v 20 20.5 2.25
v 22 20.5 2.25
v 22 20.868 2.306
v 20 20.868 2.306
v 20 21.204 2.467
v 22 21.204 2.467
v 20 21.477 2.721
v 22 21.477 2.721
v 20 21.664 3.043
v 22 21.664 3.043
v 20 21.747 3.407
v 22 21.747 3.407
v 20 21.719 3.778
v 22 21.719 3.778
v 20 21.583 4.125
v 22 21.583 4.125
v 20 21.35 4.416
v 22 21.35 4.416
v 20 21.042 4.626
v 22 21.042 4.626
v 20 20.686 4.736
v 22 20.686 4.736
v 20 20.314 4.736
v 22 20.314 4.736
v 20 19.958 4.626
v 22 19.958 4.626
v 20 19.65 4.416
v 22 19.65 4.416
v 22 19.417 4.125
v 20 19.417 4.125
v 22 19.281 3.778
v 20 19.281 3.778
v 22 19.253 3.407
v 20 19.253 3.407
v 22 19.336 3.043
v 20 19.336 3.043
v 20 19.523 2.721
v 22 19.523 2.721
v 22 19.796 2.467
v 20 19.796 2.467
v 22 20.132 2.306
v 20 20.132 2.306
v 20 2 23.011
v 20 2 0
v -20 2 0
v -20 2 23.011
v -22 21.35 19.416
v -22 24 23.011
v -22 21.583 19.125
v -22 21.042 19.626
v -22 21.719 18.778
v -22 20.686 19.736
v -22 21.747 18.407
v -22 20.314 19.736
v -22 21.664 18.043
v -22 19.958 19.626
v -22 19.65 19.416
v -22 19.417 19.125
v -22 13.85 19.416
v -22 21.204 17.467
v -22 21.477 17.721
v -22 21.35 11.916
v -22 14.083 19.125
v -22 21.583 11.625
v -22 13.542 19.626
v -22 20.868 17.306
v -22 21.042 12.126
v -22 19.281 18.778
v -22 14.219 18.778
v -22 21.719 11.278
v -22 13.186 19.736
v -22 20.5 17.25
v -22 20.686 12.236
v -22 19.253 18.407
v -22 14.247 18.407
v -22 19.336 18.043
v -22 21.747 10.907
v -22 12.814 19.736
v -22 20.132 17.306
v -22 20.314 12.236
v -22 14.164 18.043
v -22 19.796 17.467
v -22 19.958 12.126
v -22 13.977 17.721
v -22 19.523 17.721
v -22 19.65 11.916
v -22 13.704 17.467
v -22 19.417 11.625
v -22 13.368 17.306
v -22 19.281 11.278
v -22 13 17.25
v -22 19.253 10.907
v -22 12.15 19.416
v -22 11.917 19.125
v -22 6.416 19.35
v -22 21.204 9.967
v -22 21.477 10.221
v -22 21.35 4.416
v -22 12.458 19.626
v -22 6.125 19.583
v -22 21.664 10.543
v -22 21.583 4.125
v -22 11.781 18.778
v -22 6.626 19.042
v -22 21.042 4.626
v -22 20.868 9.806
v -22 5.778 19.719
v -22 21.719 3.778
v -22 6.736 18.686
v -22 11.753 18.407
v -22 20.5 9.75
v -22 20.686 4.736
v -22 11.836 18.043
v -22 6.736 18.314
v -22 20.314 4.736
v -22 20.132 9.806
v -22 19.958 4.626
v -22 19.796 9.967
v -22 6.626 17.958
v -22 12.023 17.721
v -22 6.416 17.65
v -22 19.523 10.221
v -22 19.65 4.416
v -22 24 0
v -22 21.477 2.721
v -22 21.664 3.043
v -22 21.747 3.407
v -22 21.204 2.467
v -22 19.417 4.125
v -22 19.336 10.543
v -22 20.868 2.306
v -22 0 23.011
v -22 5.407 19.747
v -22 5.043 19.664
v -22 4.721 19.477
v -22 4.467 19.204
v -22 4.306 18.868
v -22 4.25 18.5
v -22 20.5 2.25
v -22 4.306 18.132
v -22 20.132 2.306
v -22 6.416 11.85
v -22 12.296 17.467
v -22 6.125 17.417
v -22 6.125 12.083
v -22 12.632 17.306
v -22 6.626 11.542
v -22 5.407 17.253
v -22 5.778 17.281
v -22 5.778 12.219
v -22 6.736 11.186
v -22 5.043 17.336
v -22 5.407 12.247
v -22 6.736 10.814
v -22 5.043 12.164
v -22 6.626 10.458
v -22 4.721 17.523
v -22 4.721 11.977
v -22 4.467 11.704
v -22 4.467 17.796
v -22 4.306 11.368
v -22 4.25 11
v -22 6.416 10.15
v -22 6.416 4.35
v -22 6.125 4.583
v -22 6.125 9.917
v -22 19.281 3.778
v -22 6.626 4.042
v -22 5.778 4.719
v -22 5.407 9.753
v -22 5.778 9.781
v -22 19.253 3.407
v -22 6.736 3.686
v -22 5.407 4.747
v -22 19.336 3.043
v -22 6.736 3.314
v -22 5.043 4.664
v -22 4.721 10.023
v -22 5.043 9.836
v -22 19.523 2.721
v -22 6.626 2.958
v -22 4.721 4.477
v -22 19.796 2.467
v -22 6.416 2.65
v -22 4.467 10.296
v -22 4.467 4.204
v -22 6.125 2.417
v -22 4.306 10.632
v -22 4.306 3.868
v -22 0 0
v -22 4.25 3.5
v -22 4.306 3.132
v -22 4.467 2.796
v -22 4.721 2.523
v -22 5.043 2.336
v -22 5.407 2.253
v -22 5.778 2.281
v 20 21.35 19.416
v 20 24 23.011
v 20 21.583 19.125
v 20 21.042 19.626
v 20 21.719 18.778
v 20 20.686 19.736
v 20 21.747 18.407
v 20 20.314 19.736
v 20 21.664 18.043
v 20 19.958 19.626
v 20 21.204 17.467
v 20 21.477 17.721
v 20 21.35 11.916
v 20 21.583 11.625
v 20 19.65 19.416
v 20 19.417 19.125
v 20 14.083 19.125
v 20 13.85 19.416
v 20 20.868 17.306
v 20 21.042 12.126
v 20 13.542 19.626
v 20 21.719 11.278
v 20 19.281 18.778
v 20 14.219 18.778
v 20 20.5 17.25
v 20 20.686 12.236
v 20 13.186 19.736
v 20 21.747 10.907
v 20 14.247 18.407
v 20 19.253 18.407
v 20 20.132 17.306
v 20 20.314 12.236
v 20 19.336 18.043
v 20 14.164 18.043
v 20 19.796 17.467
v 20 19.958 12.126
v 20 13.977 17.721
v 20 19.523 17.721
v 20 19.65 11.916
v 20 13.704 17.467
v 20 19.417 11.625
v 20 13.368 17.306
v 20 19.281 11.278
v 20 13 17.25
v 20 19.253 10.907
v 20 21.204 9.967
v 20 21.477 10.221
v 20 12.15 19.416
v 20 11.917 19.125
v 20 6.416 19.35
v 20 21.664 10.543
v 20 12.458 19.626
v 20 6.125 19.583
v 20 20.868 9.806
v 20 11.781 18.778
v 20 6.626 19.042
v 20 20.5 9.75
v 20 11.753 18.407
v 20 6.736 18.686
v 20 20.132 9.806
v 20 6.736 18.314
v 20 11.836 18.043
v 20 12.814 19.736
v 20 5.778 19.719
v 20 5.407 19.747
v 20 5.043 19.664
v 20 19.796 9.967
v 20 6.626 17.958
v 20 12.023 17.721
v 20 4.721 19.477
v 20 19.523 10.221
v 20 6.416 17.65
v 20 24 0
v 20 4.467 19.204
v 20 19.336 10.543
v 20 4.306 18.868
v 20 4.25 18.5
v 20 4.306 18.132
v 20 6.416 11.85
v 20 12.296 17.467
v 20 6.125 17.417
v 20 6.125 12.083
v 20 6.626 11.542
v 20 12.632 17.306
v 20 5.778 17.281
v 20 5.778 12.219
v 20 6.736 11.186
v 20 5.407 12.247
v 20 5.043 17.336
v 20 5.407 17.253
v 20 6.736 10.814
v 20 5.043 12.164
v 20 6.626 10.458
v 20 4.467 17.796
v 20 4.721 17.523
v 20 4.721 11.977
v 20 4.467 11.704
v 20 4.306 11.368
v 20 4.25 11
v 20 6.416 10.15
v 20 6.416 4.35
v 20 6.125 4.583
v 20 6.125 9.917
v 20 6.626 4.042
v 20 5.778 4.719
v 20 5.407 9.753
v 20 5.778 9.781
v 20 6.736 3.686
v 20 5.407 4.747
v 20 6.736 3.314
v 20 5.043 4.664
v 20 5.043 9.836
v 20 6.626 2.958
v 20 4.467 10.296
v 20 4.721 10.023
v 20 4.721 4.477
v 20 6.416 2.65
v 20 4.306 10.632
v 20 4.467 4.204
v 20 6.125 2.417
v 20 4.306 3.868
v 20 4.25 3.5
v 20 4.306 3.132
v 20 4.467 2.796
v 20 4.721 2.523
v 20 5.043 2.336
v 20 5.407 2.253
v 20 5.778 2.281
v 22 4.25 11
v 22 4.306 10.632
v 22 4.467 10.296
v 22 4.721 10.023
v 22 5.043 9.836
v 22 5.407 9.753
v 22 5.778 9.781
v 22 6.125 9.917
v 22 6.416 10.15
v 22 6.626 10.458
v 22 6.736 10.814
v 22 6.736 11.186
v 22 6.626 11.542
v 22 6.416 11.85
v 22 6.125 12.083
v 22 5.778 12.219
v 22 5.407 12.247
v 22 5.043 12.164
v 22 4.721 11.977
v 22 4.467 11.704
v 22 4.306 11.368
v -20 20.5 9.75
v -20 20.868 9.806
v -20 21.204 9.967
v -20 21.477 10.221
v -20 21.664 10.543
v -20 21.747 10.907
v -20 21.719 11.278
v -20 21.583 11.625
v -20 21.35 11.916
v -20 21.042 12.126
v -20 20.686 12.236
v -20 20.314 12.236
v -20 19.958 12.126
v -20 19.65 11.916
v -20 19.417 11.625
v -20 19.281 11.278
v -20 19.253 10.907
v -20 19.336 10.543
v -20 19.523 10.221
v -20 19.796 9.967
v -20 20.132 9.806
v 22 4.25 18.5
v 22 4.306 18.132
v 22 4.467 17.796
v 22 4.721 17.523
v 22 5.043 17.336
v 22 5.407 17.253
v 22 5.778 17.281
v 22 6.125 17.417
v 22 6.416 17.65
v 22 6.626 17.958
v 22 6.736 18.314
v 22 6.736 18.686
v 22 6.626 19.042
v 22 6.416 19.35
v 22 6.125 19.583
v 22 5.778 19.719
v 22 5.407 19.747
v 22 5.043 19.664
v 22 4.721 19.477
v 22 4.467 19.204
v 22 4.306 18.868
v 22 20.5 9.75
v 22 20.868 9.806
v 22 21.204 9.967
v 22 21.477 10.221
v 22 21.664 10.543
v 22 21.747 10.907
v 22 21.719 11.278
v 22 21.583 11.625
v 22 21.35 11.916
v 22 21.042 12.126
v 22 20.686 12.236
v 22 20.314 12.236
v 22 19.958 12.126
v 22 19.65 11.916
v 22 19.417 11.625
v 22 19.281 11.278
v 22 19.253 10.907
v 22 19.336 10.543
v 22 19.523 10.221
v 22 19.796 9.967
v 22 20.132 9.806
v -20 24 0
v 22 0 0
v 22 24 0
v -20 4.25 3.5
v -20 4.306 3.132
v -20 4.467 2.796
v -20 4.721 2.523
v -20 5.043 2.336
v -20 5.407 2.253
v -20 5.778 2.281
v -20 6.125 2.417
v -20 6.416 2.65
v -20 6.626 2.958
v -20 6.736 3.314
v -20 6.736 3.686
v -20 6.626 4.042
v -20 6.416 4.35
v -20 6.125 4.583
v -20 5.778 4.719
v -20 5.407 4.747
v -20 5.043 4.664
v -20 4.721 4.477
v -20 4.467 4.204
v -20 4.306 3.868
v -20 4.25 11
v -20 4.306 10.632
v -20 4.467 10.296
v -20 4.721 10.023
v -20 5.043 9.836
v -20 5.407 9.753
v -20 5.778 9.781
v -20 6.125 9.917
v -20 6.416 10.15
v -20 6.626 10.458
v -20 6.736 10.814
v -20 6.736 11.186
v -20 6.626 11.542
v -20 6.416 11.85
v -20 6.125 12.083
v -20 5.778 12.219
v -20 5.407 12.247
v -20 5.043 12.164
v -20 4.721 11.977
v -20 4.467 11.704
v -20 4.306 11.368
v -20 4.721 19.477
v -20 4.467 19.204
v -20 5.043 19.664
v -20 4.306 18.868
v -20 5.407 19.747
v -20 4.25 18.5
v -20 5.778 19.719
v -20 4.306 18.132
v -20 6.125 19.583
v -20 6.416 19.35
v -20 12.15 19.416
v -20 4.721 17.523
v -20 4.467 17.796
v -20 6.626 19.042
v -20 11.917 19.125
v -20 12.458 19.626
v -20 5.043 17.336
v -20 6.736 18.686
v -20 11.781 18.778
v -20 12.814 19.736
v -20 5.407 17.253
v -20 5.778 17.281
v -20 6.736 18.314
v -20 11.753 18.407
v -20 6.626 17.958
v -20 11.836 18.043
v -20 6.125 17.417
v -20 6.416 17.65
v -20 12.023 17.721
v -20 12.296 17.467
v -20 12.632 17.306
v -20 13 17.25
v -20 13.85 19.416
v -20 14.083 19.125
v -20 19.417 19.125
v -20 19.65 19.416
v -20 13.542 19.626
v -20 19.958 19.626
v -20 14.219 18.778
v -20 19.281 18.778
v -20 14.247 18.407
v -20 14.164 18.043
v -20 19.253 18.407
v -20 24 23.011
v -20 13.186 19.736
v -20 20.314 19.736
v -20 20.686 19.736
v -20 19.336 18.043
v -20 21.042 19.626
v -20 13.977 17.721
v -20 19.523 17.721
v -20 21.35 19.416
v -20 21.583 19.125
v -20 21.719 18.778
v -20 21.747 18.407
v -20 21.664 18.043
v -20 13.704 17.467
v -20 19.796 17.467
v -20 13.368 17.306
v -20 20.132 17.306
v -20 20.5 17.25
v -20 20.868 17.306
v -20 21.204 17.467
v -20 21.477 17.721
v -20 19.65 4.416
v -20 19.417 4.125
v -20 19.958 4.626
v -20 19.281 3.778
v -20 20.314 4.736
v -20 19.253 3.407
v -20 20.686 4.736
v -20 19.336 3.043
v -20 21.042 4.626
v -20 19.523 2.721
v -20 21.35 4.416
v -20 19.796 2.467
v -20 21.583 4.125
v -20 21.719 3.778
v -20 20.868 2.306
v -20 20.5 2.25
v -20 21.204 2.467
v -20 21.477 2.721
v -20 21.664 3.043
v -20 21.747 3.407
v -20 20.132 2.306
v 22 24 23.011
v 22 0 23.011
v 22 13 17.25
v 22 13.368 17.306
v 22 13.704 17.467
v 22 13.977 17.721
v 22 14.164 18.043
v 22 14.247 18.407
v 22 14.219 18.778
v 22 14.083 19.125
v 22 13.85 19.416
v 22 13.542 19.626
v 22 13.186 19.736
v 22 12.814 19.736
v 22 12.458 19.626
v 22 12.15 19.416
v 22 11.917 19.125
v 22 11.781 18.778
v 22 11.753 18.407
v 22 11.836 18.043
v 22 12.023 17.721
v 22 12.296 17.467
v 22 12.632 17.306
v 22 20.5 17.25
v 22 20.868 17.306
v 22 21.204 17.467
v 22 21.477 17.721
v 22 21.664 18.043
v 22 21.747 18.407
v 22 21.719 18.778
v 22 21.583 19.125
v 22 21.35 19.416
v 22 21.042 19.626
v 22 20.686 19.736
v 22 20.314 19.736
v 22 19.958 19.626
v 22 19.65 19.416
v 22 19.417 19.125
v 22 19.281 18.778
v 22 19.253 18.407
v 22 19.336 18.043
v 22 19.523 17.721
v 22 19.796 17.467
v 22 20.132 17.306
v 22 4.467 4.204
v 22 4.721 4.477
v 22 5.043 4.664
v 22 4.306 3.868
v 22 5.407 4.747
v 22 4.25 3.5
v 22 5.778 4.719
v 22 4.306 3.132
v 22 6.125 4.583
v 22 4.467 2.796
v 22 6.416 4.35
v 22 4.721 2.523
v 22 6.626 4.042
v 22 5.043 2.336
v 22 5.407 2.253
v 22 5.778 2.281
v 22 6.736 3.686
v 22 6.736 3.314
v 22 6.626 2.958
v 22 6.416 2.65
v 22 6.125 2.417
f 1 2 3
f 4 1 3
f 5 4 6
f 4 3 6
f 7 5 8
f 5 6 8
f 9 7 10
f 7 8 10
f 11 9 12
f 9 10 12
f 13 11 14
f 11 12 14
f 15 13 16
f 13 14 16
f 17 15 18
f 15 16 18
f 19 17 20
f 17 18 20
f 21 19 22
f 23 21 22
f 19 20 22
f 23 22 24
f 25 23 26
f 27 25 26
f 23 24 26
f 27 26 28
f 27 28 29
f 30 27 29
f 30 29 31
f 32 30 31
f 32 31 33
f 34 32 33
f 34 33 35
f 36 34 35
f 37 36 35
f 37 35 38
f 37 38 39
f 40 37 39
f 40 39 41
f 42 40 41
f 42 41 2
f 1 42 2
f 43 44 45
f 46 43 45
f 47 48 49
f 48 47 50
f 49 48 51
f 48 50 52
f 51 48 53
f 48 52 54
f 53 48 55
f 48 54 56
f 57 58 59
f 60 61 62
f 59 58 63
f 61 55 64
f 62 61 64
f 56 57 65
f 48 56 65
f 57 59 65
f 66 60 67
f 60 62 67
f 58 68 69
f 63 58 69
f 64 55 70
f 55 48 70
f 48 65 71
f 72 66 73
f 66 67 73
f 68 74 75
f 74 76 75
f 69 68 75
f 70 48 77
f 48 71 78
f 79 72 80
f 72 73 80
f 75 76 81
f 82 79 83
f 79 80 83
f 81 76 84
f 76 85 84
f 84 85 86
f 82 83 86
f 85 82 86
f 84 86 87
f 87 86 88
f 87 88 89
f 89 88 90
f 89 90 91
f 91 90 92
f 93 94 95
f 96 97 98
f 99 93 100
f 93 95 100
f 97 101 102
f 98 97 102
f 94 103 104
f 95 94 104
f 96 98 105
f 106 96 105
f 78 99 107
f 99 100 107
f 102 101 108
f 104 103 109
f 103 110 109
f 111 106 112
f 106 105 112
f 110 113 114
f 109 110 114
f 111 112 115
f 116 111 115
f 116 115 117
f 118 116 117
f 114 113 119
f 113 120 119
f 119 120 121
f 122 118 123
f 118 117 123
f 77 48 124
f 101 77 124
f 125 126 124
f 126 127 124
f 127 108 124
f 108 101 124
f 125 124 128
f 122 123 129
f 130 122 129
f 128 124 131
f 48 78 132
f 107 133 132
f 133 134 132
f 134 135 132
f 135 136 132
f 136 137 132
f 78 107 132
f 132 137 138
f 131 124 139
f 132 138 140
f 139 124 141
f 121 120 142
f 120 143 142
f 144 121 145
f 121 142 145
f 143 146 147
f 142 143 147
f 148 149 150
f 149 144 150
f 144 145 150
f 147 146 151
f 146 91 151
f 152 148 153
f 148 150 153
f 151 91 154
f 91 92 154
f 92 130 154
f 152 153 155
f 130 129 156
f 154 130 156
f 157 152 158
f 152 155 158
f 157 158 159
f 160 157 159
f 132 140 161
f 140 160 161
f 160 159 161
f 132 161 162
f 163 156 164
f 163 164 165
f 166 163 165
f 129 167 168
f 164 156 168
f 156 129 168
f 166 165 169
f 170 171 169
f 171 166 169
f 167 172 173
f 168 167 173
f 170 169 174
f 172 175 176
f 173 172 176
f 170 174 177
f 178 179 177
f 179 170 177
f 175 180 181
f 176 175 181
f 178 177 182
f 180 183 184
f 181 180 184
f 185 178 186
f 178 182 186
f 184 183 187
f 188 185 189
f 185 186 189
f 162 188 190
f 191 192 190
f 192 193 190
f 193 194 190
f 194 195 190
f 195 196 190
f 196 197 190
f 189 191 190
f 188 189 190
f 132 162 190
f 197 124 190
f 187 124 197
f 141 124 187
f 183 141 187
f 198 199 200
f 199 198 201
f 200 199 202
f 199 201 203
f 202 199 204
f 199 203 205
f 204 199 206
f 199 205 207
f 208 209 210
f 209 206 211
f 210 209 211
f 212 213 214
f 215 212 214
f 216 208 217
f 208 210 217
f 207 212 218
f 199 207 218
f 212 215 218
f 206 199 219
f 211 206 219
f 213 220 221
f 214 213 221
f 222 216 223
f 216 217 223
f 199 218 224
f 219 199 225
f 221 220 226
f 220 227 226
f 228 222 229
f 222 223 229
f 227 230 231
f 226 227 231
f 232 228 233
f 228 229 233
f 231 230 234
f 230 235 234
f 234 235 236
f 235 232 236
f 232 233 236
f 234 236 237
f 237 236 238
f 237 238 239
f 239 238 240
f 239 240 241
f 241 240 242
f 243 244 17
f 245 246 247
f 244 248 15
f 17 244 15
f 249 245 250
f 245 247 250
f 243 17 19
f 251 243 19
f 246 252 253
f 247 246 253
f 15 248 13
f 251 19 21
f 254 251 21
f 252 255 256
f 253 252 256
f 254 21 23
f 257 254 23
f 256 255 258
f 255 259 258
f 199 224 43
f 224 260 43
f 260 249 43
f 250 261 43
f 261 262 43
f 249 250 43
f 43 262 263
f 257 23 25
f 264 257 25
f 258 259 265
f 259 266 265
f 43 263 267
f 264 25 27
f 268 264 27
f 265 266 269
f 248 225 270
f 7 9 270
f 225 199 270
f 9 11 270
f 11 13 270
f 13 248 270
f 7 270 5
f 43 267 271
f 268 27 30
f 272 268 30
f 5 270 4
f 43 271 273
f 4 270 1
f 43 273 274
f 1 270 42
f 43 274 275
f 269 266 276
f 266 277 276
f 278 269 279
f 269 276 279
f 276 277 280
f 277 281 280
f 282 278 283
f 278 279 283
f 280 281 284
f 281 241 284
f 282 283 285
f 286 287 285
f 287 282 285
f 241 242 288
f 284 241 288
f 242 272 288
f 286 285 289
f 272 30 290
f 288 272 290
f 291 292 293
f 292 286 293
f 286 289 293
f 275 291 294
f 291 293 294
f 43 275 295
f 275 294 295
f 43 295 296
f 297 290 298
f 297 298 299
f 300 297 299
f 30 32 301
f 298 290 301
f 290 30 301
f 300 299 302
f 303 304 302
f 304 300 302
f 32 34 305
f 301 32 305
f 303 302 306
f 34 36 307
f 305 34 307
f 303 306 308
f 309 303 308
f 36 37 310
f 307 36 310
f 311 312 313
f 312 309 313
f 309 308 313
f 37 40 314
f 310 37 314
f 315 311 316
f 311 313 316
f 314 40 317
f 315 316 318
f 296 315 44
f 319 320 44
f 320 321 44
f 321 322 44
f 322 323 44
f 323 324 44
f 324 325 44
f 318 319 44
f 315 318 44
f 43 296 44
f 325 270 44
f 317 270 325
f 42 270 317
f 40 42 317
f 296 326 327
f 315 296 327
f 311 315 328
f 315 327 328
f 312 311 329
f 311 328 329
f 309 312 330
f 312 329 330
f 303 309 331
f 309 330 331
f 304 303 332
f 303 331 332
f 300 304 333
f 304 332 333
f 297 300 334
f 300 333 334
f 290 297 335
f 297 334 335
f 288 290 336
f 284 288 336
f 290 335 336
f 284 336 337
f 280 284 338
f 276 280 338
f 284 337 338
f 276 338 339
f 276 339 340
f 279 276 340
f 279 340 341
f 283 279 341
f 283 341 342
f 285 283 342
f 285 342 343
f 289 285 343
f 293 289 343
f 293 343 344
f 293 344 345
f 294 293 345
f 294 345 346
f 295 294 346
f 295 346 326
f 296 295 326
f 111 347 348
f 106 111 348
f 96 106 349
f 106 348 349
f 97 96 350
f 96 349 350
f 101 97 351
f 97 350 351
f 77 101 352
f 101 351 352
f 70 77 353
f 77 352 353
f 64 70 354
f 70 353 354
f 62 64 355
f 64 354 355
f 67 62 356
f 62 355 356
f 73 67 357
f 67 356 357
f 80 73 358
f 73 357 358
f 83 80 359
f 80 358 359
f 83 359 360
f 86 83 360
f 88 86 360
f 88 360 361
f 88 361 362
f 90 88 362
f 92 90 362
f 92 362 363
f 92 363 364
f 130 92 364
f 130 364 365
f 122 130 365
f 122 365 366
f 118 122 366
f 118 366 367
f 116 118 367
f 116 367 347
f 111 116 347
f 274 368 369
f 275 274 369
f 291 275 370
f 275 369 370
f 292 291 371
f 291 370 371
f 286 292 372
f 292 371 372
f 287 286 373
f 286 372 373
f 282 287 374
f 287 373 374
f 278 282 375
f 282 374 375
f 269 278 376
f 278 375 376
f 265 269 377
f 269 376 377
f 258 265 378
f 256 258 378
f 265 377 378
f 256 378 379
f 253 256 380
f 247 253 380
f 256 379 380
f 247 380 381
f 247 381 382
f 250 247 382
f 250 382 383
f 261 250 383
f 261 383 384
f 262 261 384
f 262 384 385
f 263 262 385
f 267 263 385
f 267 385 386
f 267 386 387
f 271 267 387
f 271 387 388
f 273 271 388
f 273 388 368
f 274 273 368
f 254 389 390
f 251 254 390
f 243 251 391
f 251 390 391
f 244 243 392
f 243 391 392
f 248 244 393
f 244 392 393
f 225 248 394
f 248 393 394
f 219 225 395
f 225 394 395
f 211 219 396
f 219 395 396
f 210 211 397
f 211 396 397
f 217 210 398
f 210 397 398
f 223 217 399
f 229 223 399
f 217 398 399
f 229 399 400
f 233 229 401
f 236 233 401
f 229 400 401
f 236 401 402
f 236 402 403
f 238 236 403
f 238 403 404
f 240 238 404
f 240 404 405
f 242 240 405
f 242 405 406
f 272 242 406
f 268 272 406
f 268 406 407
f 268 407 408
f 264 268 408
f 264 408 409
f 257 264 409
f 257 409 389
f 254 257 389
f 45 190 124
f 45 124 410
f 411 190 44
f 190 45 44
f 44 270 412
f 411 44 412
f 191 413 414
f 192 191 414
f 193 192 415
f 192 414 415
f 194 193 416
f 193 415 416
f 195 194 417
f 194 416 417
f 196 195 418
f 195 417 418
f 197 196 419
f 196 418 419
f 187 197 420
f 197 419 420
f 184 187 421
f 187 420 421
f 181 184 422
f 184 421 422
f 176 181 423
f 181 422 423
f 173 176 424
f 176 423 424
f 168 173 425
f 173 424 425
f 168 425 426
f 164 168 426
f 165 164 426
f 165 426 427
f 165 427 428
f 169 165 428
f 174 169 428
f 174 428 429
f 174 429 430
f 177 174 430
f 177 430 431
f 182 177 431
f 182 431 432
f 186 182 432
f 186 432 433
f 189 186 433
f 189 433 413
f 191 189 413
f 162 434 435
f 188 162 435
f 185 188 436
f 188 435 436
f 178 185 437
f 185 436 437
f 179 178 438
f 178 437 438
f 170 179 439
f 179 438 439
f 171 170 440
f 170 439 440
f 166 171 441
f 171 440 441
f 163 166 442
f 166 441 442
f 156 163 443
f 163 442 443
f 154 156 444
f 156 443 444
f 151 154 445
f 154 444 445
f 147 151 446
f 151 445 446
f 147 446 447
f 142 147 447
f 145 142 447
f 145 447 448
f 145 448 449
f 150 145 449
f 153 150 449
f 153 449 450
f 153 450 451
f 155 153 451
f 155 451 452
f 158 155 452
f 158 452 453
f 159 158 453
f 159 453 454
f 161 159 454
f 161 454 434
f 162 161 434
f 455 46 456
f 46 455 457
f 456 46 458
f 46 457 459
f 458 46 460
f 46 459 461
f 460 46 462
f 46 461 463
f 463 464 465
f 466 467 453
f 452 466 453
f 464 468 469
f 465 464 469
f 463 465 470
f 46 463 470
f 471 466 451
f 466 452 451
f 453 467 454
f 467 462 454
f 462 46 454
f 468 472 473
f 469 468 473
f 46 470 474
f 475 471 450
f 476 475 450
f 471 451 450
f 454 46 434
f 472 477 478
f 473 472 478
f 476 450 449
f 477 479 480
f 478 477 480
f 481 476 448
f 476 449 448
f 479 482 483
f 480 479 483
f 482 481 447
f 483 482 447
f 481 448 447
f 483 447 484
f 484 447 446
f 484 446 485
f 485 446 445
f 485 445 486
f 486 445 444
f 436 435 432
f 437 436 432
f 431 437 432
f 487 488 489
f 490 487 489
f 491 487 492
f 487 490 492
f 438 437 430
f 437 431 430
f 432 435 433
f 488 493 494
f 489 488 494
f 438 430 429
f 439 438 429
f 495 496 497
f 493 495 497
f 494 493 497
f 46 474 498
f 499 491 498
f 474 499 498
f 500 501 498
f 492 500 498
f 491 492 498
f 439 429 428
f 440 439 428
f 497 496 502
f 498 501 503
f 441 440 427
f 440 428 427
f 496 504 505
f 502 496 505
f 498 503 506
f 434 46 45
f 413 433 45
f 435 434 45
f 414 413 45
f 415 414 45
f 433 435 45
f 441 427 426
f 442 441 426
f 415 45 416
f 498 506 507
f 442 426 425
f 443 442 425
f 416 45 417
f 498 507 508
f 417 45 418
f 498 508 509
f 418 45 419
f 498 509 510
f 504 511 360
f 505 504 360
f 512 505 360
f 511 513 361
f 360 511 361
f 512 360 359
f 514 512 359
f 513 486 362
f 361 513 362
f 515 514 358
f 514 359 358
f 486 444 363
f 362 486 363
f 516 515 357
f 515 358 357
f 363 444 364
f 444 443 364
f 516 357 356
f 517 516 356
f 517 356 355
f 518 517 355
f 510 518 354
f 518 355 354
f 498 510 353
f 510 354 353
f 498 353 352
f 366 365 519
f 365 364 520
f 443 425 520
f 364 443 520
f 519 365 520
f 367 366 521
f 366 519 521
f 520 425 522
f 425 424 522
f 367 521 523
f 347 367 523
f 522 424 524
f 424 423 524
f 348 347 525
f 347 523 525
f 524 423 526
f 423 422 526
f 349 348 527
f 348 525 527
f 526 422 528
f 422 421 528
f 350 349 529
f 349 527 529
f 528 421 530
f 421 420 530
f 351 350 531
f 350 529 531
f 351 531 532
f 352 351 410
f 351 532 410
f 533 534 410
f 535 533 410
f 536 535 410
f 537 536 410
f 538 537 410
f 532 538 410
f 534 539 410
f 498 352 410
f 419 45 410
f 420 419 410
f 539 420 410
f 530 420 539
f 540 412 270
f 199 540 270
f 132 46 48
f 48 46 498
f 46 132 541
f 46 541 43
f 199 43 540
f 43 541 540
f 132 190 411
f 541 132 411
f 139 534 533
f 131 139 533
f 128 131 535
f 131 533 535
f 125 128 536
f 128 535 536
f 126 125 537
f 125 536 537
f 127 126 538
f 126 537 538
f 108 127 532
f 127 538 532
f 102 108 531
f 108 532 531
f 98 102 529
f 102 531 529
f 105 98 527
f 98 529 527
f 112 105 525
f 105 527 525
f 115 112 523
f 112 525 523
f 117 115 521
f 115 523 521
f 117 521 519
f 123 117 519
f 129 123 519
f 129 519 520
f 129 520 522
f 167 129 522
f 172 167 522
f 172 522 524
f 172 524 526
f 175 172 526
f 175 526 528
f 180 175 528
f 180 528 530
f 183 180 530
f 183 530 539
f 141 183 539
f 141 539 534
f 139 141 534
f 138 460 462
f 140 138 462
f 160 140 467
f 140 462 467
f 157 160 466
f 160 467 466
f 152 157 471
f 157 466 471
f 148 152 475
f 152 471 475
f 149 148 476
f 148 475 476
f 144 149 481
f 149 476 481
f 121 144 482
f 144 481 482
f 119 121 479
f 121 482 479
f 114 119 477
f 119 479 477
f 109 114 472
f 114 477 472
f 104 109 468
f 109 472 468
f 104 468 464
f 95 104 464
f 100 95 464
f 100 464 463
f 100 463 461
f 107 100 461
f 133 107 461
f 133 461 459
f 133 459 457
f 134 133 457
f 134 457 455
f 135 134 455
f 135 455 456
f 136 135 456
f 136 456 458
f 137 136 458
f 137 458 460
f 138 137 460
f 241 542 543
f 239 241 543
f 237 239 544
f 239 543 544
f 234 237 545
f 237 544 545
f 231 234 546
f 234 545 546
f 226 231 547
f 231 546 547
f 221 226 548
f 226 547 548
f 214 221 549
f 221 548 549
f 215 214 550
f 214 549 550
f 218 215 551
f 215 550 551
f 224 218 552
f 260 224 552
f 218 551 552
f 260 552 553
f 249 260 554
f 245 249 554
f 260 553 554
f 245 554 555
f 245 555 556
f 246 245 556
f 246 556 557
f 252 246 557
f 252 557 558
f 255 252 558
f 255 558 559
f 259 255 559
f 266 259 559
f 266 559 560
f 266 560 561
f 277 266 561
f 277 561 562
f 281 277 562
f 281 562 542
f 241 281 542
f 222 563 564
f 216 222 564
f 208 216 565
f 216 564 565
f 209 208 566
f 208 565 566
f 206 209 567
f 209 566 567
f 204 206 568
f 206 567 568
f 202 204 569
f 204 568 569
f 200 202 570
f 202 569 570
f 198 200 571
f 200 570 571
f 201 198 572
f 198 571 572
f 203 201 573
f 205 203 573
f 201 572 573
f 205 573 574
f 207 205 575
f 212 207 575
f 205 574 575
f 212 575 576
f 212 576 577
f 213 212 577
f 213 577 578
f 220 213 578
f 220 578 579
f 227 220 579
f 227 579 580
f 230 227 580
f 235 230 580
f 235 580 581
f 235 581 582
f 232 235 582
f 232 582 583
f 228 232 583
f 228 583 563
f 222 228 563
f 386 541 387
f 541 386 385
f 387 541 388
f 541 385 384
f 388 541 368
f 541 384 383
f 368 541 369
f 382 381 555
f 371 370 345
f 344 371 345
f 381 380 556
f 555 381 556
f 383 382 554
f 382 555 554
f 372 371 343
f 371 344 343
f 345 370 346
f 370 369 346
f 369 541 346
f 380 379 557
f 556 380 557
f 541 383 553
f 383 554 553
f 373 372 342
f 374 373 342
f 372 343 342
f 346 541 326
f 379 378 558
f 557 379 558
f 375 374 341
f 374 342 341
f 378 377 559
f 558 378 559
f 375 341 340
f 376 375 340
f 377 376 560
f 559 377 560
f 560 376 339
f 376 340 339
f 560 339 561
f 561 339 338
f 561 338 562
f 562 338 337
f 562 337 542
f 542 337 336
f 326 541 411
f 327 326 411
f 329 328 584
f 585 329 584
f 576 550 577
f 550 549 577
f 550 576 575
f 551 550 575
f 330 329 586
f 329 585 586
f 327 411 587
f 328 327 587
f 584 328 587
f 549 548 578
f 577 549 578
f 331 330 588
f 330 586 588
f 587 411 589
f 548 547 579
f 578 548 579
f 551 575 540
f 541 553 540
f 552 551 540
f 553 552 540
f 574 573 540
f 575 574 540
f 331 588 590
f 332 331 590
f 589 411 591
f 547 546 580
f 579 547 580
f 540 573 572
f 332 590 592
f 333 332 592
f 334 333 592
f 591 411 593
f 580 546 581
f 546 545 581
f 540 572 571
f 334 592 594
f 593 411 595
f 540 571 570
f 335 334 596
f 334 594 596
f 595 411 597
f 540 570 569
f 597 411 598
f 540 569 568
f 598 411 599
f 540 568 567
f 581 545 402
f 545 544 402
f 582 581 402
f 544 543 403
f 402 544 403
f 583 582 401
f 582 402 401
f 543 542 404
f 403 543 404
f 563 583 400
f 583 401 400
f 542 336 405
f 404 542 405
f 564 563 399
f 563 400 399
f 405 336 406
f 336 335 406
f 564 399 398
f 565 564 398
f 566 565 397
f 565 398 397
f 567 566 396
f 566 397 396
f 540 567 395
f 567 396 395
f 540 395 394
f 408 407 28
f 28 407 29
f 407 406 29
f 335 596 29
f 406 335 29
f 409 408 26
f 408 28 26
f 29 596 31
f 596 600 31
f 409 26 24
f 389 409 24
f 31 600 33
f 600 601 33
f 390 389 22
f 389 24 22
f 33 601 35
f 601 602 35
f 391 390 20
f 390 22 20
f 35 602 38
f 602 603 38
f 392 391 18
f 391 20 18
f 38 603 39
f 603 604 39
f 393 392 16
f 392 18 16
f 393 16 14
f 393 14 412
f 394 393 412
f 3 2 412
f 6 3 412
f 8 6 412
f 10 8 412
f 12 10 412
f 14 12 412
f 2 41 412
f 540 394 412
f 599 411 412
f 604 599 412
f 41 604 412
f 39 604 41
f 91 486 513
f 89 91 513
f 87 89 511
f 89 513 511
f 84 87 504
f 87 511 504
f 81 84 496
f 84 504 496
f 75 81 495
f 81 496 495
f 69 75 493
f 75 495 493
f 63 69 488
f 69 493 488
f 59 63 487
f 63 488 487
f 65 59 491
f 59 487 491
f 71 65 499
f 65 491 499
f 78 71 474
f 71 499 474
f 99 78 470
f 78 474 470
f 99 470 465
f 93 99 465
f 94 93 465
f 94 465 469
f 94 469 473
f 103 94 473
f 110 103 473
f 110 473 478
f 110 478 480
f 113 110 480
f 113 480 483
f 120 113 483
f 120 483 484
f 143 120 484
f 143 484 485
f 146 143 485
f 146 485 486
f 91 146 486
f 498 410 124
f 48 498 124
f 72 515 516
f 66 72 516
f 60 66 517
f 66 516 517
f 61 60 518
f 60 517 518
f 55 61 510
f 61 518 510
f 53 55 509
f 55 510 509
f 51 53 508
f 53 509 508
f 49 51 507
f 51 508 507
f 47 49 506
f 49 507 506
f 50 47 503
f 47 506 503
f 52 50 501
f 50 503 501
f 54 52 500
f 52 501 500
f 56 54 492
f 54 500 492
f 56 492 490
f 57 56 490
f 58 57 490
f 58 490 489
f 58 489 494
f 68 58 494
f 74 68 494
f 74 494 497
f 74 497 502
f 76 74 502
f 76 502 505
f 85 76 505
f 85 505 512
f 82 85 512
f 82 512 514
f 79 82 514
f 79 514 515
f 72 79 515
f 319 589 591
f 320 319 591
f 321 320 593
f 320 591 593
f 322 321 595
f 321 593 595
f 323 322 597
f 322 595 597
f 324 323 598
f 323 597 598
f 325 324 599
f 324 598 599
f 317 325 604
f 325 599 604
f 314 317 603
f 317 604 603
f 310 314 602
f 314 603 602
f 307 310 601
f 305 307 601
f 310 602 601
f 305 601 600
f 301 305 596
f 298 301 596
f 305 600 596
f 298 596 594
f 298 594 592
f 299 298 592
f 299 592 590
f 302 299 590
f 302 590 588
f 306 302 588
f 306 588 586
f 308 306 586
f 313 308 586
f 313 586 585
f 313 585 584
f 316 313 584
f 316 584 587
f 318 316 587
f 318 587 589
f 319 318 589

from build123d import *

# Parameters (mm, degrees)
EXTRUDE_1_DEPTH     = 32
SKETCH_3_R          = 1.25
CUT_EXTRUDE_2_DEPTH = 60.464274989
SKETCH_5_R          = 2.2
CUT_EXTRUDE_3_DEPTH = 45.631827209
SKETCH_6_W          = 8.988665833
SKETCH_6_H          = 24
CUT_EXTRUDE_4_DEPTH = 60.464274989


with BuildPart() as part:
    # 草图1 → 凸台-拉伸1 (new body)
    with BuildSketch(Plane.XY):
        Polygon((-22, 0), (22, 0), (22, 24), (20, 24), (20, 2), (-20, 2), (-20, 24), (-22, 24), align=None)
    extrude(amount=EXTRUDE_1_DEPTH)

    # 草图3 → 切除-拉伸2 (cut, through all)
    with BuildSketch(Plane(origin=(22, 0, 0), x_dir=(0, 0, -1), z_dir=(1, 0, 0))):
        with Locations((-3.5, 20.5)):
            Circle(SKETCH_3_R)
        with Locations((-18.5, 20.5)):
            Circle(SKETCH_3_R)
        with Locations((-11, 20.5)):
            Circle(SKETCH_3_R)
        with Locations(Location((-3.5, 5.5, 0), (0, 0, 270))):
            Circle(SKETCH_3_R)
        with Locations(Location((-11, 5.5, 0), (0, 0, 270))):
            Circle(SKETCH_3_R)
        with Locations(Location((-18.5, 5.5, 0), (0, 0, 270))):
            Circle(SKETCH_3_R)
        with Locations((-18.5, 13)):
            Circle(SKETCH_3_R)
    extrude(amount=-CUT_EXTRUDE_2_DEPTH, mode=Mode.SUBTRACT)

    # 草图5 → 切除-拉伸3 (cut, through all)
    with BuildSketch(Plane(origin=(0, 2, 0), x_dir=(1, 0, 0), z_dir=(0, 1, 0))):
        with Locations(Location((-15, -27, 0), (0, 0, 270))):
            Circle(SKETCH_5_R)
        with Locations(Location((15, -27, 0), (0, 0, 90))):
            Circle(SKETCH_5_R)
    extrude(amount=-CUT_EXTRUDE_3_DEPTH, mode=Mode.SUBTRACT)

    # 草图6 → 切除-拉伸4 (cut, through all)
    with BuildSketch(Plane(origin=(22, 0, 0), x_dir=(0, 0, -1), z_dir=(1, 0, 0))):
        with Locations((-27.505667084, 12)):
            Rectangle(SKETCH_6_W, SKETCH_6_H)
    extrude(amount=-CUT_EXTRUDE_4_DEPTH, mode=Mode.SUBTRACT)


solid = part.part
